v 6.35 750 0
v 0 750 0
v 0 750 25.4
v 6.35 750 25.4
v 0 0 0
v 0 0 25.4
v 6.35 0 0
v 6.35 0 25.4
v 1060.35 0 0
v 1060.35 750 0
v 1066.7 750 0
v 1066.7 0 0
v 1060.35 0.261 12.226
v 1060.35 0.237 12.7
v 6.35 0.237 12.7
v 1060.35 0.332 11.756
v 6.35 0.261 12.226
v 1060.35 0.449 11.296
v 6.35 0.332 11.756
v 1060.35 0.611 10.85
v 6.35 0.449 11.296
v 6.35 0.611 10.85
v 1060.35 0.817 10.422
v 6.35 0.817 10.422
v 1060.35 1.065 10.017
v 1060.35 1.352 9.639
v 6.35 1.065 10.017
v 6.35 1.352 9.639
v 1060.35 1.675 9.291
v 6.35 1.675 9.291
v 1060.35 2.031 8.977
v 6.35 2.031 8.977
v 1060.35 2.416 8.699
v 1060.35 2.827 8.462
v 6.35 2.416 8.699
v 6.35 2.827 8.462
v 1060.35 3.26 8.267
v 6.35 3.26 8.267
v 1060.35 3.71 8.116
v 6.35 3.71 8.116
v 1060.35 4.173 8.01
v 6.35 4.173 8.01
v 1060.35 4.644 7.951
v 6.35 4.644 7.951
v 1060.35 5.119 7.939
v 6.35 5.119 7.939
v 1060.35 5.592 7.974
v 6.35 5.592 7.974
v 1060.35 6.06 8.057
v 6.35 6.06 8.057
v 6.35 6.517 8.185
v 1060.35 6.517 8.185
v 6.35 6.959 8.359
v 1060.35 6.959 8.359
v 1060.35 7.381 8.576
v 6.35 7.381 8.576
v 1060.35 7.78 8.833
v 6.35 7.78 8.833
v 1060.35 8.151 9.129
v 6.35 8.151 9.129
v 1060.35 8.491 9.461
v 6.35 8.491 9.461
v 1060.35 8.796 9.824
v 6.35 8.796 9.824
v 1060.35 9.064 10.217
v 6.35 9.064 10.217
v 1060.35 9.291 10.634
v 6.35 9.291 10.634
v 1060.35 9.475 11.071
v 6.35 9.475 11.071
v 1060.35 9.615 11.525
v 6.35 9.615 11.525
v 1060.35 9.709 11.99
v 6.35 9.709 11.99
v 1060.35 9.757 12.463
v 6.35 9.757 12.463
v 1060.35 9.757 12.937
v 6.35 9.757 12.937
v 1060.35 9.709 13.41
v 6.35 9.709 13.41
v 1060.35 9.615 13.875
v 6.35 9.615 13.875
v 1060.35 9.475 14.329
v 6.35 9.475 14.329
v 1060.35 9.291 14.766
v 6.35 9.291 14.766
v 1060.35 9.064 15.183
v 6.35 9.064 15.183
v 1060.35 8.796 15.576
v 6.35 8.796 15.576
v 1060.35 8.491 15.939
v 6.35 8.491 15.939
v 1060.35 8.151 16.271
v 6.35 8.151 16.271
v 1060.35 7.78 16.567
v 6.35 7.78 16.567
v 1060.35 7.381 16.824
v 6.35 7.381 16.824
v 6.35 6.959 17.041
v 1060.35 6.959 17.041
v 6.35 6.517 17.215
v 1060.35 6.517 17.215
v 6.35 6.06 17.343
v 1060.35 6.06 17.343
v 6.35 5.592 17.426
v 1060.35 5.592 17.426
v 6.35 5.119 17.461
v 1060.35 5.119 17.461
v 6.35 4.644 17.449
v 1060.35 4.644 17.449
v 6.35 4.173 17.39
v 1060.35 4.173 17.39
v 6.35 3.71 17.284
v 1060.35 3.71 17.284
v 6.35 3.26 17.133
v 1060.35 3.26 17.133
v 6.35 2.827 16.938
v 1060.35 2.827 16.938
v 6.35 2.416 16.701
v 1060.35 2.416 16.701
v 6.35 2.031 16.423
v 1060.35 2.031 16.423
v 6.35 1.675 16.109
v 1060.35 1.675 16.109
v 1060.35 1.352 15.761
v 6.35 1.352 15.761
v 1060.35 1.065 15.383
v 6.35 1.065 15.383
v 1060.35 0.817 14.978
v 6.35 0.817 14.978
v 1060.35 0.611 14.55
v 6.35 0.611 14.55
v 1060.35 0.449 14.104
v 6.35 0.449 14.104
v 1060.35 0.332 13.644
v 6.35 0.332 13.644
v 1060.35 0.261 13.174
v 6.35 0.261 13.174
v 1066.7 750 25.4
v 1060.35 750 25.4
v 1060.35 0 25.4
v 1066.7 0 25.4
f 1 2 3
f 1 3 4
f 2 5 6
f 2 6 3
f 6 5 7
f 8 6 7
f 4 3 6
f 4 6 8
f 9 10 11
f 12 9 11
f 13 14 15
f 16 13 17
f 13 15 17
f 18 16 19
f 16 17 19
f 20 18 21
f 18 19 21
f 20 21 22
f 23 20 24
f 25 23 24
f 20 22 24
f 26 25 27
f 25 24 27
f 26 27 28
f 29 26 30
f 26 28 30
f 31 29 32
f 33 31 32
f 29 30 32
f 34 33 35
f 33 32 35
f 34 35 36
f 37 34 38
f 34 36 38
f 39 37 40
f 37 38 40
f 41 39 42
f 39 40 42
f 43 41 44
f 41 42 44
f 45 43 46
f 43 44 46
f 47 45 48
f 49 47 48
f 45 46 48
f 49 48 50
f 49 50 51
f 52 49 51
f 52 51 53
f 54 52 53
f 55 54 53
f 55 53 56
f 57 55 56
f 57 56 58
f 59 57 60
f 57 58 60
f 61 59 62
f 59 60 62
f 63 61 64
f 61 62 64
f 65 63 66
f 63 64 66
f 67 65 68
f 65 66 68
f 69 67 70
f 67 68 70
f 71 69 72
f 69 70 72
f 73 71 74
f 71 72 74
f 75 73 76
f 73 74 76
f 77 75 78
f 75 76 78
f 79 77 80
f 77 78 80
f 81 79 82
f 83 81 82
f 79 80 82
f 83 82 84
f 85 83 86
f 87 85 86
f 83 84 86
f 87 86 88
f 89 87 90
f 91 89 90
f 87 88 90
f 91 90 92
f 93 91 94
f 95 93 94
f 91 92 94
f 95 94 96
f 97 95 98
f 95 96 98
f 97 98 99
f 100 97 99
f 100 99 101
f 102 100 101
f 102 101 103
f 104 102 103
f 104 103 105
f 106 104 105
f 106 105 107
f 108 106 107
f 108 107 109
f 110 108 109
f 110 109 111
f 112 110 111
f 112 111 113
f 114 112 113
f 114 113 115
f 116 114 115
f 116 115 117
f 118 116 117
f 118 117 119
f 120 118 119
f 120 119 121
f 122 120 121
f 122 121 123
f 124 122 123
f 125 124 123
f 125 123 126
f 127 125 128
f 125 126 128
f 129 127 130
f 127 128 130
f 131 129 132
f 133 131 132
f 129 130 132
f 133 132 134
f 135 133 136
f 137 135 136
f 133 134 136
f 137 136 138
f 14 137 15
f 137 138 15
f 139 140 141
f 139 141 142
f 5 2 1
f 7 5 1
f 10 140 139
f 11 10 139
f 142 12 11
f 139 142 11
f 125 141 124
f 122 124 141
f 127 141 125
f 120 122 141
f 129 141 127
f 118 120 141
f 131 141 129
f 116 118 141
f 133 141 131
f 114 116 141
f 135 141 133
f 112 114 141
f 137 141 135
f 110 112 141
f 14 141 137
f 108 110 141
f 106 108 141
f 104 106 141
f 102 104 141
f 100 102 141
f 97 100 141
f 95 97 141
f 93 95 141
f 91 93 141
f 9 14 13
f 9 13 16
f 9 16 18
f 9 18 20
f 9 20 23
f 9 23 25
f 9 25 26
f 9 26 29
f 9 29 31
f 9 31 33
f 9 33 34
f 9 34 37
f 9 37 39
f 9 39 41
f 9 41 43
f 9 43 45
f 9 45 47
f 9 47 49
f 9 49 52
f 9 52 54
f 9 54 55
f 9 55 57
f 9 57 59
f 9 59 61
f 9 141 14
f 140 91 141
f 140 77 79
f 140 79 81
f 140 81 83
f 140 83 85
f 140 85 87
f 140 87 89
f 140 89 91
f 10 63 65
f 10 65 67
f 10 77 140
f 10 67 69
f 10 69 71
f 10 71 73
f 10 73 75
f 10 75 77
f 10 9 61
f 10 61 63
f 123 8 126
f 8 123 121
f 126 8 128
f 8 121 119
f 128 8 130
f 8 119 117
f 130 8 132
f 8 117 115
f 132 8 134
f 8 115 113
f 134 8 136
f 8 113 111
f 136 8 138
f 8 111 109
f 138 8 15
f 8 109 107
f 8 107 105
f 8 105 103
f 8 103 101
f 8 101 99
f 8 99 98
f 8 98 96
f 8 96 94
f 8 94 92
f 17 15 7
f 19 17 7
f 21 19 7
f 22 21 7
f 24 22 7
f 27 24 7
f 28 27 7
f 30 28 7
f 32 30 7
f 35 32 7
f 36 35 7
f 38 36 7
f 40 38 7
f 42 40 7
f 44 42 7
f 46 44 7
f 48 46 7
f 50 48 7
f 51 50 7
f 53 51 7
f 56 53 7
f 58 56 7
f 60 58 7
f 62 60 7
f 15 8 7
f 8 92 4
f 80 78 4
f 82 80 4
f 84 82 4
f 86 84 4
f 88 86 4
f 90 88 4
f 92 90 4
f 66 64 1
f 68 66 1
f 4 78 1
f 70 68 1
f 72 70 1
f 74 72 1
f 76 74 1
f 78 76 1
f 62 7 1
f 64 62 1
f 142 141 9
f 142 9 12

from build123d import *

# Parameters (mm, degrees)
CROQUIS1_W                = 6.35
CROQUIS1_H                = 750
SALIENTE_EXTRUIR1_DEPTH   = 25.4
SALIENTE_EXTRUIR1_2_DEPTH = 25.4
CROQUIS2_R                = 4.7625
SALIENTE_EXTRUIR2_DEPTH   = 1054


with BuildPart() as part:
    # Croquis1 → Saliente-Extruir1 (new body)
    with BuildSketch(Plane.XY):
        with Locations((3.175, 375)):
            Rectangle(CROQUIS1_W, CROQUIS1_H)
    extrude(amount=SALIENTE_EXTRUIR1_DEPTH)



with BuildPart() as body_2:
    # Croquis1 → Saliente-Extruir1 2 (new body)
    with BuildSketch(Plane.XY):
        with Locations((1063.525, 375)):
            Rectangle(CROQUIS1_W, CROQUIS1_H)
    extrude(amount=SALIENTE_EXTRUIR1_2_DEPTH)


with BuildPart() as part_1:
    add(part.part)

    add(body_2.part)  # Saliente-Extruir2 merges body 2
    # Croquis2 → Saliente-Extruir2 (add)
    with BuildSketch(Plane(origin=(6.35, 0, 0), x_dir=(0, 0, -1), z_dir=(1, 0, 0))):
        with Locations(Location((-12.7, 5, 0), (0, 0, 270))):
            Circle(CROQUIS2_R)
    extrude(amount=SALIENTE_EXTRUIR2_DEPTH)


solid = part_1.part
